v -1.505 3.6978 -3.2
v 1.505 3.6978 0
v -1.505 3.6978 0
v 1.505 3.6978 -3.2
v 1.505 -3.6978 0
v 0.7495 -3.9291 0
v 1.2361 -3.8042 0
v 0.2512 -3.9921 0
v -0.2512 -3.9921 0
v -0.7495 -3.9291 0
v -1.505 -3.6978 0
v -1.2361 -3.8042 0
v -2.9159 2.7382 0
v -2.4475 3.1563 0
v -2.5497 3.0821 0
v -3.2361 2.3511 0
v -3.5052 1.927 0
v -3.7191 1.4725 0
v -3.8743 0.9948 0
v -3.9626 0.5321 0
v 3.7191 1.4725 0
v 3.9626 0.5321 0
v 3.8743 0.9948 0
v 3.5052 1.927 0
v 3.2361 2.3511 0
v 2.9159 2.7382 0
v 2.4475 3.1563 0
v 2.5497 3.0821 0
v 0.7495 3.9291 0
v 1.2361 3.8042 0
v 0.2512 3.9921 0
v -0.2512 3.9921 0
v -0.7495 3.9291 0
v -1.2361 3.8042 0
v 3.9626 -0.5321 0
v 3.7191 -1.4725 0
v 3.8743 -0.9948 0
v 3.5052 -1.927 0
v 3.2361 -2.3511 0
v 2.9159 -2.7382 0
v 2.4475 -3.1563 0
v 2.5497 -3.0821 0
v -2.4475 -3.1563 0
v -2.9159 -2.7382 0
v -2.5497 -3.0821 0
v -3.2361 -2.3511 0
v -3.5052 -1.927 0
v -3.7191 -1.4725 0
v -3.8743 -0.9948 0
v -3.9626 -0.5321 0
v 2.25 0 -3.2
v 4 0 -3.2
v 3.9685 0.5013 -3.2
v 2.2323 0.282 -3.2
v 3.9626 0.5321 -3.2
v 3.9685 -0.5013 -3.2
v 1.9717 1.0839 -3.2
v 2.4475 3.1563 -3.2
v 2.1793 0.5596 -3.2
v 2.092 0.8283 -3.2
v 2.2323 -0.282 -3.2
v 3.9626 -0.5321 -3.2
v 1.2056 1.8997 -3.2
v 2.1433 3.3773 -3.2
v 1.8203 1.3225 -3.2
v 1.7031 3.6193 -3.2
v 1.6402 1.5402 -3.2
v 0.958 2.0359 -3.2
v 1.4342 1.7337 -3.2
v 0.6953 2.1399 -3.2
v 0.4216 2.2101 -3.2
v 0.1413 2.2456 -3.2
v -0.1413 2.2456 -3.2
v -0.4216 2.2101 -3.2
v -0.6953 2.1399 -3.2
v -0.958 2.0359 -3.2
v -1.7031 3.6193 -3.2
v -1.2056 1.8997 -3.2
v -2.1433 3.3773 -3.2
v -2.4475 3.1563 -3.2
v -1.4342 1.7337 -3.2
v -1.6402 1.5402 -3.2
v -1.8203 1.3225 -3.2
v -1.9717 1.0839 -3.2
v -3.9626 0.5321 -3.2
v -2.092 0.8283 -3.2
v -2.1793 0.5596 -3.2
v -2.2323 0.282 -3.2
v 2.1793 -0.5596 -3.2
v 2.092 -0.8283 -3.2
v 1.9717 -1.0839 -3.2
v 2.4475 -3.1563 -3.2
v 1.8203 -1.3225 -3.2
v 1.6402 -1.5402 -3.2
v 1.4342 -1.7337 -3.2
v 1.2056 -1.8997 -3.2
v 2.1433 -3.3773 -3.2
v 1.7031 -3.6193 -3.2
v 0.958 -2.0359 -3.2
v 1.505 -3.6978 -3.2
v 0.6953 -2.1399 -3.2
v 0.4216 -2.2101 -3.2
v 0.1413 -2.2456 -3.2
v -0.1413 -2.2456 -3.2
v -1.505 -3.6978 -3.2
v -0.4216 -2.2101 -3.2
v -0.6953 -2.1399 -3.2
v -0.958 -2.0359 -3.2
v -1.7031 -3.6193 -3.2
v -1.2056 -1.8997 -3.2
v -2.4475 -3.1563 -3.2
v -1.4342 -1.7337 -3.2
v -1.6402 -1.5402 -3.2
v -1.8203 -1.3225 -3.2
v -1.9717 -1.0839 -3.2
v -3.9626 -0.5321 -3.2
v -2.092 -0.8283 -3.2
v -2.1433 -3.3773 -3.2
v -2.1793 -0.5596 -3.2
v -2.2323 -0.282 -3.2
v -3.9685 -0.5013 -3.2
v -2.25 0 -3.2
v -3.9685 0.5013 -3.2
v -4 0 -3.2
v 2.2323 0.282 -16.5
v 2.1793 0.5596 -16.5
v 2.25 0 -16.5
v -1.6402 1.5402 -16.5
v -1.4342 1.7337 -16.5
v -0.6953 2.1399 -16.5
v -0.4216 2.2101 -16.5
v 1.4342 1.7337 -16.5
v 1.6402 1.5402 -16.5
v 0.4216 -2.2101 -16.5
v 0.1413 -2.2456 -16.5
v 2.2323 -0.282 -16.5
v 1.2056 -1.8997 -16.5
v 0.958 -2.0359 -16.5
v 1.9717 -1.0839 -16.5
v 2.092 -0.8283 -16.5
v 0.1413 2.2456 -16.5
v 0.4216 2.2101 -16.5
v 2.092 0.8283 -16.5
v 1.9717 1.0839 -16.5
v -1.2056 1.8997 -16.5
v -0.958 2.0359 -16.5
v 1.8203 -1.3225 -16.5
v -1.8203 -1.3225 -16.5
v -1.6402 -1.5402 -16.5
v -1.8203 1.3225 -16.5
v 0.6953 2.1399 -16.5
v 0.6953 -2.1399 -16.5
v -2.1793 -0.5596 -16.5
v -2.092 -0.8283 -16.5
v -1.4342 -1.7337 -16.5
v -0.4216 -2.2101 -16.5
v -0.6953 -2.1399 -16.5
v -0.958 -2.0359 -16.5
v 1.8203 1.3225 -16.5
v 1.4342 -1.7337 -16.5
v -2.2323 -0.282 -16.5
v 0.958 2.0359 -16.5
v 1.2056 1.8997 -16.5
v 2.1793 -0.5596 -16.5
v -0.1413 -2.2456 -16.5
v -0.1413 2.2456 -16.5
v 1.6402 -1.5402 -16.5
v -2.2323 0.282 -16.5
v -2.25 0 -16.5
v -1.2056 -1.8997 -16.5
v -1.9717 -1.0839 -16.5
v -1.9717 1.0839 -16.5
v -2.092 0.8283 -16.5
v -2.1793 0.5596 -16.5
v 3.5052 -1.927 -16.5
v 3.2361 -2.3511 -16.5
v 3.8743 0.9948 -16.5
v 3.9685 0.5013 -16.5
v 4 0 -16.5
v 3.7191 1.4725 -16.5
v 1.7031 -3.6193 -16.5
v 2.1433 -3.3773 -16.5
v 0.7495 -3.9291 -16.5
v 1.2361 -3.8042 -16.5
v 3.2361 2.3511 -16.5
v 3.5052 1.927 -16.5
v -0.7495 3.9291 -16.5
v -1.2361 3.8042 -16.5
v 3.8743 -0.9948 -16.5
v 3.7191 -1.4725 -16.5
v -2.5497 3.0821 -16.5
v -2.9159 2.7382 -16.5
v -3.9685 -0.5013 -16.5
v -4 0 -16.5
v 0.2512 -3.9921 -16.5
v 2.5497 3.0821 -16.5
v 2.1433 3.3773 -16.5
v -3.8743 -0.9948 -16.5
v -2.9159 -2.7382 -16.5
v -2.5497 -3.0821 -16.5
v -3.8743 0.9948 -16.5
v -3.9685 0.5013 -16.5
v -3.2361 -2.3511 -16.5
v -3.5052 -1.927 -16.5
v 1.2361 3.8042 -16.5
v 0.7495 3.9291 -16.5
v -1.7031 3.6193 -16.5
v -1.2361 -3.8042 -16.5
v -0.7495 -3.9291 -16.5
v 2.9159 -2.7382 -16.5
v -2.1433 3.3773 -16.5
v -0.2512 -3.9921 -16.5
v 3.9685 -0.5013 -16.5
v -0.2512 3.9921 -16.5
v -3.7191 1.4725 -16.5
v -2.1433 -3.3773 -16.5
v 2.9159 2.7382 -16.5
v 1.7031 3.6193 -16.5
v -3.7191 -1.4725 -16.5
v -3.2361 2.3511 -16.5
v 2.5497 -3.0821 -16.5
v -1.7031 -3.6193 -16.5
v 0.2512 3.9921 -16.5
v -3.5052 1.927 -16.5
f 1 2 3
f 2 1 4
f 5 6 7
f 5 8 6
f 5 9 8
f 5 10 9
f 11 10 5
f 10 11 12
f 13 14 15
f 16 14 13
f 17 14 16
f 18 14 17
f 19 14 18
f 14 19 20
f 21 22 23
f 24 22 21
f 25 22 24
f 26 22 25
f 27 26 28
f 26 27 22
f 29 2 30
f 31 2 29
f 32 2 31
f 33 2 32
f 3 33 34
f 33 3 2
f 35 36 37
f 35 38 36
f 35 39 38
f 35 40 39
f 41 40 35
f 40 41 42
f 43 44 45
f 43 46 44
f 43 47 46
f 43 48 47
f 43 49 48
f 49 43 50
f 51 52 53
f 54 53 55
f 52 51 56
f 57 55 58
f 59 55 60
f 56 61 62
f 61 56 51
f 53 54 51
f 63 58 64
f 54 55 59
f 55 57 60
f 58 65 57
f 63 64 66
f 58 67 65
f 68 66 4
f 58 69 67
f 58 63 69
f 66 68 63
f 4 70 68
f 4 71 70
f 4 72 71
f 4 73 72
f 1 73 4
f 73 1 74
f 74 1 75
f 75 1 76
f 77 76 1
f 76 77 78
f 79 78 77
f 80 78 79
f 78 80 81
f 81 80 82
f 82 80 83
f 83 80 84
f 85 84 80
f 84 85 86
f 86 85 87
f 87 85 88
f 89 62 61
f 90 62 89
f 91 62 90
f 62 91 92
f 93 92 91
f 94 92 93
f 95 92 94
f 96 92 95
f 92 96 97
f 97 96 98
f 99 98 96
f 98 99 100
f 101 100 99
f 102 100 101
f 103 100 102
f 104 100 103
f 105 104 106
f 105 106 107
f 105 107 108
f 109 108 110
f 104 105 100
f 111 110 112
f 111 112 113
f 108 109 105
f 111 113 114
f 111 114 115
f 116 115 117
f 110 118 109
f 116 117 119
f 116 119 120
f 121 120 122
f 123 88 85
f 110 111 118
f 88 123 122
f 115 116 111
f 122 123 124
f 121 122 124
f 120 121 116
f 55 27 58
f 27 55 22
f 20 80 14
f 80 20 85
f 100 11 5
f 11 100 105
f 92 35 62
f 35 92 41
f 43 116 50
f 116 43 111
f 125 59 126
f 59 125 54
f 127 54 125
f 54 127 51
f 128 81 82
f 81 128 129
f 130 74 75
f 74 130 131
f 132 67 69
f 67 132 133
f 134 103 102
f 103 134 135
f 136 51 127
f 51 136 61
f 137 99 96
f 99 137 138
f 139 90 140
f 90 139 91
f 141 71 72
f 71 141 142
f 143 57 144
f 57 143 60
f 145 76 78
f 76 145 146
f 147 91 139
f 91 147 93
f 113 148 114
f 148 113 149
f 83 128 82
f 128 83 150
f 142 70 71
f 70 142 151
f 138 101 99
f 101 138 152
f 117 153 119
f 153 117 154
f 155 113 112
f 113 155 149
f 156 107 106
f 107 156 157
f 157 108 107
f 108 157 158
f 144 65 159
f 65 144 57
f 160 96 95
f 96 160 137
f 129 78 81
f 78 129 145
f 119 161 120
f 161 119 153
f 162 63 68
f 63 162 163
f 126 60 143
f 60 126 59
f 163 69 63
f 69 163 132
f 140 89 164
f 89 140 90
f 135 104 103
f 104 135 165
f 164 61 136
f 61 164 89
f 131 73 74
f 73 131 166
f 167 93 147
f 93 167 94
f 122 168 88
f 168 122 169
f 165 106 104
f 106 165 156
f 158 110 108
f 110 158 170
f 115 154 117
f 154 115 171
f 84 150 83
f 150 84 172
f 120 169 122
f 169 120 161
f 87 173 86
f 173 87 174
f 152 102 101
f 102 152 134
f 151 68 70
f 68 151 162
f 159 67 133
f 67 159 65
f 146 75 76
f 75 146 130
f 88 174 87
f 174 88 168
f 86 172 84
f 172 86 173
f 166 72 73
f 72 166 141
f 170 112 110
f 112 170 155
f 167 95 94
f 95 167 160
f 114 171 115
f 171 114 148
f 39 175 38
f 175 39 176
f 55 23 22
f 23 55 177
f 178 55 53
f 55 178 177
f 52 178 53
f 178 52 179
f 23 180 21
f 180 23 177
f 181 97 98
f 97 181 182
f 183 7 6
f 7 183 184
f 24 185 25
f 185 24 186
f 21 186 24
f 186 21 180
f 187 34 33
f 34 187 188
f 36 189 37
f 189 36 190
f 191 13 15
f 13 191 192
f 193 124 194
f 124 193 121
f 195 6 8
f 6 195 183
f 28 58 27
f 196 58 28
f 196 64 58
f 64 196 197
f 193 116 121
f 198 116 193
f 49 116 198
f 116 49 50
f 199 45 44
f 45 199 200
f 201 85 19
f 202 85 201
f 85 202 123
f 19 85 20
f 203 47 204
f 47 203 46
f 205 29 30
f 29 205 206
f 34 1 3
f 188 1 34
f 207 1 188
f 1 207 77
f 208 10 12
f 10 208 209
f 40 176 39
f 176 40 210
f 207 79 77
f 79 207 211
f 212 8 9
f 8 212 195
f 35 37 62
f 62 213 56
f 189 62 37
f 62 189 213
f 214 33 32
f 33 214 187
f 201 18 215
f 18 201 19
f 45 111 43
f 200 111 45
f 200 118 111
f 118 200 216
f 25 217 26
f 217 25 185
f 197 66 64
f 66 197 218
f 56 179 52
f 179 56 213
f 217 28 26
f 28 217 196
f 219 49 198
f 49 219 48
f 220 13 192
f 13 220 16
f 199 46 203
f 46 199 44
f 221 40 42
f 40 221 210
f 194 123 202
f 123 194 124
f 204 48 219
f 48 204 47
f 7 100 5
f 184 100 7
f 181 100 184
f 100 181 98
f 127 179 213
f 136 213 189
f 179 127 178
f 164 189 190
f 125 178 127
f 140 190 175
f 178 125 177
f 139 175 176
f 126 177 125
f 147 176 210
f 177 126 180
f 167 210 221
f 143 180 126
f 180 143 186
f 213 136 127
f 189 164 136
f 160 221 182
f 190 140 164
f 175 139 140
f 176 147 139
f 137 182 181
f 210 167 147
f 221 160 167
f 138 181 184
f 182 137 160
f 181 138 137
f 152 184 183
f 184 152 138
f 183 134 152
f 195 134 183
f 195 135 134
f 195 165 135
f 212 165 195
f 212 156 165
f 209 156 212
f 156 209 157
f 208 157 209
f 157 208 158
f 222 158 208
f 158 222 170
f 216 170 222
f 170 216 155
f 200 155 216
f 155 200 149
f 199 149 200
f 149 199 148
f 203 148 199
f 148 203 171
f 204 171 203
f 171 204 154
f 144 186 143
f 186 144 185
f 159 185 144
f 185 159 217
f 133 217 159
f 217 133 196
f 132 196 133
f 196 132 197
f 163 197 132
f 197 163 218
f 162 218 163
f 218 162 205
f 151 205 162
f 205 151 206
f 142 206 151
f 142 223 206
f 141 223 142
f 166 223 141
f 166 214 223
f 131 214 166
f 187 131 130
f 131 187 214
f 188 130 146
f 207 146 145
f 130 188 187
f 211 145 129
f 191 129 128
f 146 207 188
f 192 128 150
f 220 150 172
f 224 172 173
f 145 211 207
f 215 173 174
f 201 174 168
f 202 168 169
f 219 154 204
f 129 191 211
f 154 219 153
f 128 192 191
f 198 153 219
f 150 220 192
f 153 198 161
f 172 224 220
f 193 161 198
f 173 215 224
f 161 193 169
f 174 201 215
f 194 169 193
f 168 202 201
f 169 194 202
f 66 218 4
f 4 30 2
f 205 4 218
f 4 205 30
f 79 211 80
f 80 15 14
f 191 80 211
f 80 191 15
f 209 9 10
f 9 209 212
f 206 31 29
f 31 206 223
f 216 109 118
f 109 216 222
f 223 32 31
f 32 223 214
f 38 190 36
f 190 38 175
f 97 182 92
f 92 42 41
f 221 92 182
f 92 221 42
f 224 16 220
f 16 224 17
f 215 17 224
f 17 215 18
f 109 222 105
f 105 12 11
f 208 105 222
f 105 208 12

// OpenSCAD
$fn = 50;

difference() {
	union() {
		translate(v = [0, 0, -16.5]) {
			cylinder(h = 16.5, r = 4.0);
		}
	}
	union() {
		translate(v = [0, 0, 0]) {
			rotate(a = [0, 0, 0]) {
				difference() {
					union() {
						translate(v = [0, 0, -3.2]) {
							linear_extrude(height = 3.2) {
								polygon(points = [[4.2698, 0.0], [2.1349000000000005, 3.697755269078796], [-2.134899999999999, 3.6977552690787965], [-4.2698, 5.228996902999369e-16], [-2.134900000000002, -3.6977552690787956], [2.1348999999999974, -3.697755269078798]]);
							}
						}
					}
					union();
				}
			}
		}
		#translate(v = [0, 0, -100.0]) {
			cylinder(h = 200, r = 2.25);
		}
	}
}
